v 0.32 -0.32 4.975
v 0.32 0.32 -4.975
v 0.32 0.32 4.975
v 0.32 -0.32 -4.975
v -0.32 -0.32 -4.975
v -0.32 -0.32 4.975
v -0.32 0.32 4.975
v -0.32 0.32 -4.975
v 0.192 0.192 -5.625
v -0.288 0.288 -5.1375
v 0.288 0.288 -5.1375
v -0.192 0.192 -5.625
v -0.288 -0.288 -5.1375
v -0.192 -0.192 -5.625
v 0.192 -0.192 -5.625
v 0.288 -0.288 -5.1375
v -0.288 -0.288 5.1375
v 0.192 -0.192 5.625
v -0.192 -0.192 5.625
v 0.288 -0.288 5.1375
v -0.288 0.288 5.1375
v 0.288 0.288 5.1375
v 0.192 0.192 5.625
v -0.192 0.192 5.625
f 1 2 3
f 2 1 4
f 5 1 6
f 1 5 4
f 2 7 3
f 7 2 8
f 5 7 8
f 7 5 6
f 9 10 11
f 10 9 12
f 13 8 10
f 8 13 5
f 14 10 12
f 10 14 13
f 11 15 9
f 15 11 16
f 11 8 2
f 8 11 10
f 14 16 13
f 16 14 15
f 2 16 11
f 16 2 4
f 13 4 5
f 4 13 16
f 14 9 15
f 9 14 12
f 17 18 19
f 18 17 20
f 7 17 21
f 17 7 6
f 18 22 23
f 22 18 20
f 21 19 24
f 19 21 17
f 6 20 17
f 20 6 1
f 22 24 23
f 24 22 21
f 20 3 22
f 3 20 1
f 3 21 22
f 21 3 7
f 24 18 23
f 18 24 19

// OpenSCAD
// Start: lazy_union
default_5_default_5();
// End: lazy_union

// Modules.

// 'PartMaterial undef-default - default 5.0'
module default_5_default_5() {
  // 'None : _combine_solids_and_holes'
  union() {
    // 'default : _combine_solids_and_holes'
    union() {
      // 'mid'
      multmatrix(m=[[0.7071067811865475, 0.7071067811865475, 0.0, 0.0], [0.7071067811865475, -0.7071067811865475, 0.0, 0.0], [0.0, 0.0, -1.0, 4.975], [0.0, 0.0, 0.0, 1.0]]) {
        // 'mid : _combine_solids_and_holes'
        union() {
          // 'prism'
          multmatrix(m=[[-1.0, -0.0, -0.0, -0.0], [-0.0, -1.0, -0.0, -0.0], [0.0, 0.0, 1.0, 0.0], [0.0, 0.0, 0.0, 1.0]]) {
            // 'prism : _combine_solids_and_holes'
            union() {
              // 'prism'
              linear_extrude(height=9.95, twist=0.0, slices=4, scale=[1.0, 1.0]) {
                polygon(points=[[-0.45254833995939037, 0.0], [-2.7710593799535783e-17, 0.45254833995939037], [0.45254833995939037, 5.5421187599071566e-17], [8.313178139860734e-17, -0.45254833995939037]]);
              }
            }
          }
        }
      }
      // 'upper'
      multmatrix(m=[[0.7071067811865475, 0.7071067811865475, 0.0, 0.0], [0.7071067811865475, -0.7071067811865475, 0.0, 0.0], [0.0, 0.0, -1.0, -4.975], [0.0, 0.0, 0.0, 1.0]]) {
        // 'upper : _combine_solids_and_holes'
        union() {
          // 'prism'
          multmatrix(m=[[-1.0, -0.0, -0.0, -0.0], [-0.0, -1.0, -0.0, -0.0], [0.0, 0.0, 1.0, 0.0], [0.0, 0.0, 0.0, 1.0]]) {
            // 'prism : _combine_solids_and_holes'
            union() {
              // 'prism'
              linear_extrude(height=0.65, twist=0.0, slices=4, scale=[0.6, 0.6]) {
                polygon(points=[[-0.45254833995939037, 0.0], [-0.3394112549695428, 0.11313708498984759], [-0.2262741699796952, 0.22627416997969518], [-0.11313708498984762, 0.3394112549695428], [-2.7710593799535783e-17, 0.45254833995939037], [0.11313708498984759, 0.3394112549695428], [0.22627416997969518, 0.2262741699796952], [0.3394112549695428, 0.11313708498984763], [0.45254833995939037, 5.5421187599071566e-17], [0.3394112549695428, -0.11313708498984754], [0.22627416997969524, -0.22627416997969516], [0.11313708498984766, -0.3394112549695428], [8.313178139860734e-17, -0.45254833995939037], [-0.11313708498984754, -0.33941125496954283], [-0.22627416997969516, -0.22627416997969524], [-0.3394112549695428, -0.11313708498984767]]);
              }
            }
          }
        }
      }
      // 'lower'
      multmatrix(m=[[0.7071067811865475, 0.7071067811865475, 0.0, 0.0], [-0.7071067811865475, 0.7071067811865475, 0.0, 0.0], [0.0, 0.0, 1.0, 4.975], [0.0, 0.0, 0.0, 1.0]]) {
        // 'lower : _combine_solids_and_holes'
        union() {
          // 'prism'
          multmatrix(m=[[-1.0, -0.0, -0.0, -0.0], [-0.0, -1.0, -0.0, -0.0], [0.0, 0.0, 1.0, 0.0], [0.0, 0.0, 0.0, 1.0]]) {
            // 'prism : _combine_solids_and_holes'
            union() {
              // 'prism'
              linear_extrude(height=0.65, twist=0.0, slices=4, scale=[0.6, 0.6]) {
                polygon(points=[[-0.45254833995939037, 0.0], [-0.3394112549695428, 0.11313708498984759], [-0.2262741699796952, 0.22627416997969518], [-0.11313708498984762, 0.3394112549695428], [-2.7710593799535783e-17, 0.45254833995939037], [0.11313708498984759, 0.3394112549695428], [0.22627416997969518, 0.2262741699796952], [0.3394112549695428, 0.11313708498984763], [0.45254833995939037, 5.5421187599071566e-17], [0.3394112549695428, -0.11313708498984754], [0.22627416997969524, -0.22627416997969516], [0.11313708498984766, -0.3394112549695428], [8.313178139860734e-17, -0.45254833995939037], [-0.11313708498984754, -0.33941125496954283], [-0.22627416997969516, -0.22627416997969524], [-0.3394112549695428, -0.11313708498984767]]);
              }
            }
          }
        }
      }
    }
  }
} // end module default_5_default_5
